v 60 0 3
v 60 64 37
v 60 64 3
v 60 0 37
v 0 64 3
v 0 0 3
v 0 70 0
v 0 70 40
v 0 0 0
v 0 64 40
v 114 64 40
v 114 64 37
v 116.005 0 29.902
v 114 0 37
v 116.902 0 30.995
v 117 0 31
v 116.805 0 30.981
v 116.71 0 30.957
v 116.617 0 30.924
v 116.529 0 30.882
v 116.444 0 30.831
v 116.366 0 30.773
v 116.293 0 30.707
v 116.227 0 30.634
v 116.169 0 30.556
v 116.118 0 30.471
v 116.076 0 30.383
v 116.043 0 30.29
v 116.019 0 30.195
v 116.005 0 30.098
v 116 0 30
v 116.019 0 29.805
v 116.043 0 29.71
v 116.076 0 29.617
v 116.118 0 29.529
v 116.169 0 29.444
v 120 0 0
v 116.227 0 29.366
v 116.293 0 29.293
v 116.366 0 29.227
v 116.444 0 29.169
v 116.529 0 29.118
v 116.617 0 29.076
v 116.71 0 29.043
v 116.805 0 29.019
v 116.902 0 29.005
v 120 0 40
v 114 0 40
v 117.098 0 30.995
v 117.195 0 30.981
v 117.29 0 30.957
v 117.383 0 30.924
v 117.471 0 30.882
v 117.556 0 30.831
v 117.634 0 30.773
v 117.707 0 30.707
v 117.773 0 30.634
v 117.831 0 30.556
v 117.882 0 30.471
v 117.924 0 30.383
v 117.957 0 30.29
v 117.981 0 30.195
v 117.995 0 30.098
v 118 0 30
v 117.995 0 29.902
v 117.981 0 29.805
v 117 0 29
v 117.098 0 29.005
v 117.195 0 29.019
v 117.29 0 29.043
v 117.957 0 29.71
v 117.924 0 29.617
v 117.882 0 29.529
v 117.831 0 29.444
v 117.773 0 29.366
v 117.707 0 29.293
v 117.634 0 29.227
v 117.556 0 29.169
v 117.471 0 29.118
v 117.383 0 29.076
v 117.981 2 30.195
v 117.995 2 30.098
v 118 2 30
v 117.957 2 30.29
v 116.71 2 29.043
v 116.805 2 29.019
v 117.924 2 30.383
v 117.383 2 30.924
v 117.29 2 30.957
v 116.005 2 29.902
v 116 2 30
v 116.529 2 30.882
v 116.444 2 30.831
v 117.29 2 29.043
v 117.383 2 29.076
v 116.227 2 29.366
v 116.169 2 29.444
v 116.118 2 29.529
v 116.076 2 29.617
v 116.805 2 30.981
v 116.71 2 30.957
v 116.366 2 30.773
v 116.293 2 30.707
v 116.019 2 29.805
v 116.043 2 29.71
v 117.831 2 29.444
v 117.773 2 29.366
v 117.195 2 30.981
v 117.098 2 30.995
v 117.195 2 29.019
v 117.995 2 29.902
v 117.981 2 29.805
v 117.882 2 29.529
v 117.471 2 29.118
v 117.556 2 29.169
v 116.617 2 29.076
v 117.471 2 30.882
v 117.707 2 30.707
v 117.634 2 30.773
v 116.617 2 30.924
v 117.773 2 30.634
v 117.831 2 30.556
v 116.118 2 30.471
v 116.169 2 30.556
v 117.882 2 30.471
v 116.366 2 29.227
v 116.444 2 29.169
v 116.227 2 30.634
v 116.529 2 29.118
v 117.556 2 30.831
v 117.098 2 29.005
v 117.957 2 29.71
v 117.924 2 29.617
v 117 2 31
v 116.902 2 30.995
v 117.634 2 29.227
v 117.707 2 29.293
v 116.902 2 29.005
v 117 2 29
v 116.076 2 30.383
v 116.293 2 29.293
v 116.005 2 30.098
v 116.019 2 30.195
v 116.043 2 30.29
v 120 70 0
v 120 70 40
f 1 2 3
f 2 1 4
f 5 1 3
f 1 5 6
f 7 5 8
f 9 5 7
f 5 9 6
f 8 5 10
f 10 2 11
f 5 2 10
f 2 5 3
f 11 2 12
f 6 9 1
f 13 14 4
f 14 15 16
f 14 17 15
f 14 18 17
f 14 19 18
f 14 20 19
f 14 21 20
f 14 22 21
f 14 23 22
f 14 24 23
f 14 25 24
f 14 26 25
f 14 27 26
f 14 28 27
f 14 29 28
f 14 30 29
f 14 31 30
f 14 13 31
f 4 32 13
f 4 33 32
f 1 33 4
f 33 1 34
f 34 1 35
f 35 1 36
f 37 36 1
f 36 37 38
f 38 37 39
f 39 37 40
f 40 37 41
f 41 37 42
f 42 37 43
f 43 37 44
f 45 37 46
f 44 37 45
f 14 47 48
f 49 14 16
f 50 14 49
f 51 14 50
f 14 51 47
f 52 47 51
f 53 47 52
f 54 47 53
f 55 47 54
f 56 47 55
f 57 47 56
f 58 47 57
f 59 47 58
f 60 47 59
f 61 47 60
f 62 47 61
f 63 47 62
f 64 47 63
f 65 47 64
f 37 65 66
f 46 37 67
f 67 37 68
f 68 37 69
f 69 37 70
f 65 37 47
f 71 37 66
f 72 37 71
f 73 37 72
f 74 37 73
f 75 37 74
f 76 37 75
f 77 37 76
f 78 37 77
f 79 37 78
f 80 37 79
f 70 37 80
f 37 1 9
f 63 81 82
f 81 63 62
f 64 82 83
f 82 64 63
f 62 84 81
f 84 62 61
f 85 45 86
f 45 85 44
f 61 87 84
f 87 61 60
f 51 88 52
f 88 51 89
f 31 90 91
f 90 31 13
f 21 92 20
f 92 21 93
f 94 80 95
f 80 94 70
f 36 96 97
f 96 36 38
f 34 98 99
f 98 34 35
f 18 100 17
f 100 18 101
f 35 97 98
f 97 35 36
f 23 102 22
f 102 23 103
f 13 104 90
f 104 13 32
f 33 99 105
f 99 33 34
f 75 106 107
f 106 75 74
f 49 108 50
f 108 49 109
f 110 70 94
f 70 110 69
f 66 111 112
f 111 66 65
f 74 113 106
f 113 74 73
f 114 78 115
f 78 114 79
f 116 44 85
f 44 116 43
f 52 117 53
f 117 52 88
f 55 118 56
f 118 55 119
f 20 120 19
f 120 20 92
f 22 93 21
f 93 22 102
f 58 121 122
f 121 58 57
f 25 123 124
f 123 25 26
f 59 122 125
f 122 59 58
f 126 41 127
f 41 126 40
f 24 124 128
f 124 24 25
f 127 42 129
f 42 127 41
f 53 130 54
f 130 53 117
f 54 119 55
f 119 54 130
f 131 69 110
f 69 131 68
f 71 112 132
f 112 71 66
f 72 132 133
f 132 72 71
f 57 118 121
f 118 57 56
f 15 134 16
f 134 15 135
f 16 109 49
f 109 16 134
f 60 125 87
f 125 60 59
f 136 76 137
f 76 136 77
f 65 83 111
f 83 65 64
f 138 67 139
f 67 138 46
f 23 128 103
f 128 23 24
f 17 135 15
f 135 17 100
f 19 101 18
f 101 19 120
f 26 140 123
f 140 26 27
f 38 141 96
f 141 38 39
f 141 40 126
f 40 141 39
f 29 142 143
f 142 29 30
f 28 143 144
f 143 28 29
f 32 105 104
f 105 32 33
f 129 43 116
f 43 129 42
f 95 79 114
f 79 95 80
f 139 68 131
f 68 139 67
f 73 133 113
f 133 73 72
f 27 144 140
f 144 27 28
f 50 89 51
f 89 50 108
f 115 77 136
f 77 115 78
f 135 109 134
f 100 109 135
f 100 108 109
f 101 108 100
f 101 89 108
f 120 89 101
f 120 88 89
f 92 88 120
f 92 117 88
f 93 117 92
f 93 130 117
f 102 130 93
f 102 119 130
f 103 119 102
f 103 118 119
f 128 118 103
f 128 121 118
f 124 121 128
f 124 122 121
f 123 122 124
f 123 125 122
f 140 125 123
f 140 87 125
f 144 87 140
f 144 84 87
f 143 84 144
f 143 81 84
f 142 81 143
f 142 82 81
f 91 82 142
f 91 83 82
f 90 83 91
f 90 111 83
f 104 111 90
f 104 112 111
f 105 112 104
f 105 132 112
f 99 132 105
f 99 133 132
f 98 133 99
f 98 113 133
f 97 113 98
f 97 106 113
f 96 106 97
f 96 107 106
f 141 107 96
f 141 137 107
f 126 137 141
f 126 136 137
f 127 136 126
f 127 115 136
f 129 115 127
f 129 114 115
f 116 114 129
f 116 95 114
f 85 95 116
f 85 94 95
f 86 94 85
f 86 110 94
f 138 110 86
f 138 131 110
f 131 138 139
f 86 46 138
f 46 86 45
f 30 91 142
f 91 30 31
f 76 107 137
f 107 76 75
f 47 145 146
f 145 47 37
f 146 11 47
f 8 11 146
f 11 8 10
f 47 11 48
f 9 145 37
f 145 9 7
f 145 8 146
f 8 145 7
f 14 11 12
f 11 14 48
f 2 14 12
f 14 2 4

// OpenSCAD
// Mini horizontal gel-electrophoresis box - buffer tank
// Print orientation: base on XY plane, open top facing +Z

// ---- Tank dimensions ----
outer_x = 120;   // outer length in X
outer_y = 70;    // outer width in Y
height  = 40;    // overall height in Z
wall    = 3;     // wall thickness
floor   = 3;     // floor thickness (bottom solid)

// ---- Platform dimensions ----
plat_len   = 60; // platform length in X (centred)
plat_wid   = outer_y - 2*wall; // platform spans full inner width
plat_top_z = 13; // top of platform (inner floor + 10 mm)

// ---- Wire holes ----
hole_d     = 2;  // electrode wire hole diameter
hole_y     = 0;  // hole Y position
hole_z     = 30; // hole Z position
eps        = 0.5; // cutter overshoot past end walls

$fn = 64;

difference() {
    // Main tank body
    cube([outer_x, outer_y, height]);

    // Open top (cavity)
    translate([0, 0, height - floor])
        cube([outer_x - 2*wall, outer_y - 2*wall, height - floor]);

    // Raised platform
    union() {
        translate([0, 0, floor])
            cube([plat_len, plat_wid, plat_top_z - floor]);
        // extend slightly above top so it fuses with the open-top cavity
        translate([0, 0, plat_top_z - floor])
            cube([plat_len, plat_wid, height - floor + 1]);
    }

    // Electrode wire holes through each end wall along X
    for (sx = [-1, 1])
        translate([sx > 0 ? outer_x - wall : -wall, hole_y, hole_z])
            rotate([90, 0, 0])
                cylinder(d = hole_d, h = wall + 2*eps, center = true);
}
